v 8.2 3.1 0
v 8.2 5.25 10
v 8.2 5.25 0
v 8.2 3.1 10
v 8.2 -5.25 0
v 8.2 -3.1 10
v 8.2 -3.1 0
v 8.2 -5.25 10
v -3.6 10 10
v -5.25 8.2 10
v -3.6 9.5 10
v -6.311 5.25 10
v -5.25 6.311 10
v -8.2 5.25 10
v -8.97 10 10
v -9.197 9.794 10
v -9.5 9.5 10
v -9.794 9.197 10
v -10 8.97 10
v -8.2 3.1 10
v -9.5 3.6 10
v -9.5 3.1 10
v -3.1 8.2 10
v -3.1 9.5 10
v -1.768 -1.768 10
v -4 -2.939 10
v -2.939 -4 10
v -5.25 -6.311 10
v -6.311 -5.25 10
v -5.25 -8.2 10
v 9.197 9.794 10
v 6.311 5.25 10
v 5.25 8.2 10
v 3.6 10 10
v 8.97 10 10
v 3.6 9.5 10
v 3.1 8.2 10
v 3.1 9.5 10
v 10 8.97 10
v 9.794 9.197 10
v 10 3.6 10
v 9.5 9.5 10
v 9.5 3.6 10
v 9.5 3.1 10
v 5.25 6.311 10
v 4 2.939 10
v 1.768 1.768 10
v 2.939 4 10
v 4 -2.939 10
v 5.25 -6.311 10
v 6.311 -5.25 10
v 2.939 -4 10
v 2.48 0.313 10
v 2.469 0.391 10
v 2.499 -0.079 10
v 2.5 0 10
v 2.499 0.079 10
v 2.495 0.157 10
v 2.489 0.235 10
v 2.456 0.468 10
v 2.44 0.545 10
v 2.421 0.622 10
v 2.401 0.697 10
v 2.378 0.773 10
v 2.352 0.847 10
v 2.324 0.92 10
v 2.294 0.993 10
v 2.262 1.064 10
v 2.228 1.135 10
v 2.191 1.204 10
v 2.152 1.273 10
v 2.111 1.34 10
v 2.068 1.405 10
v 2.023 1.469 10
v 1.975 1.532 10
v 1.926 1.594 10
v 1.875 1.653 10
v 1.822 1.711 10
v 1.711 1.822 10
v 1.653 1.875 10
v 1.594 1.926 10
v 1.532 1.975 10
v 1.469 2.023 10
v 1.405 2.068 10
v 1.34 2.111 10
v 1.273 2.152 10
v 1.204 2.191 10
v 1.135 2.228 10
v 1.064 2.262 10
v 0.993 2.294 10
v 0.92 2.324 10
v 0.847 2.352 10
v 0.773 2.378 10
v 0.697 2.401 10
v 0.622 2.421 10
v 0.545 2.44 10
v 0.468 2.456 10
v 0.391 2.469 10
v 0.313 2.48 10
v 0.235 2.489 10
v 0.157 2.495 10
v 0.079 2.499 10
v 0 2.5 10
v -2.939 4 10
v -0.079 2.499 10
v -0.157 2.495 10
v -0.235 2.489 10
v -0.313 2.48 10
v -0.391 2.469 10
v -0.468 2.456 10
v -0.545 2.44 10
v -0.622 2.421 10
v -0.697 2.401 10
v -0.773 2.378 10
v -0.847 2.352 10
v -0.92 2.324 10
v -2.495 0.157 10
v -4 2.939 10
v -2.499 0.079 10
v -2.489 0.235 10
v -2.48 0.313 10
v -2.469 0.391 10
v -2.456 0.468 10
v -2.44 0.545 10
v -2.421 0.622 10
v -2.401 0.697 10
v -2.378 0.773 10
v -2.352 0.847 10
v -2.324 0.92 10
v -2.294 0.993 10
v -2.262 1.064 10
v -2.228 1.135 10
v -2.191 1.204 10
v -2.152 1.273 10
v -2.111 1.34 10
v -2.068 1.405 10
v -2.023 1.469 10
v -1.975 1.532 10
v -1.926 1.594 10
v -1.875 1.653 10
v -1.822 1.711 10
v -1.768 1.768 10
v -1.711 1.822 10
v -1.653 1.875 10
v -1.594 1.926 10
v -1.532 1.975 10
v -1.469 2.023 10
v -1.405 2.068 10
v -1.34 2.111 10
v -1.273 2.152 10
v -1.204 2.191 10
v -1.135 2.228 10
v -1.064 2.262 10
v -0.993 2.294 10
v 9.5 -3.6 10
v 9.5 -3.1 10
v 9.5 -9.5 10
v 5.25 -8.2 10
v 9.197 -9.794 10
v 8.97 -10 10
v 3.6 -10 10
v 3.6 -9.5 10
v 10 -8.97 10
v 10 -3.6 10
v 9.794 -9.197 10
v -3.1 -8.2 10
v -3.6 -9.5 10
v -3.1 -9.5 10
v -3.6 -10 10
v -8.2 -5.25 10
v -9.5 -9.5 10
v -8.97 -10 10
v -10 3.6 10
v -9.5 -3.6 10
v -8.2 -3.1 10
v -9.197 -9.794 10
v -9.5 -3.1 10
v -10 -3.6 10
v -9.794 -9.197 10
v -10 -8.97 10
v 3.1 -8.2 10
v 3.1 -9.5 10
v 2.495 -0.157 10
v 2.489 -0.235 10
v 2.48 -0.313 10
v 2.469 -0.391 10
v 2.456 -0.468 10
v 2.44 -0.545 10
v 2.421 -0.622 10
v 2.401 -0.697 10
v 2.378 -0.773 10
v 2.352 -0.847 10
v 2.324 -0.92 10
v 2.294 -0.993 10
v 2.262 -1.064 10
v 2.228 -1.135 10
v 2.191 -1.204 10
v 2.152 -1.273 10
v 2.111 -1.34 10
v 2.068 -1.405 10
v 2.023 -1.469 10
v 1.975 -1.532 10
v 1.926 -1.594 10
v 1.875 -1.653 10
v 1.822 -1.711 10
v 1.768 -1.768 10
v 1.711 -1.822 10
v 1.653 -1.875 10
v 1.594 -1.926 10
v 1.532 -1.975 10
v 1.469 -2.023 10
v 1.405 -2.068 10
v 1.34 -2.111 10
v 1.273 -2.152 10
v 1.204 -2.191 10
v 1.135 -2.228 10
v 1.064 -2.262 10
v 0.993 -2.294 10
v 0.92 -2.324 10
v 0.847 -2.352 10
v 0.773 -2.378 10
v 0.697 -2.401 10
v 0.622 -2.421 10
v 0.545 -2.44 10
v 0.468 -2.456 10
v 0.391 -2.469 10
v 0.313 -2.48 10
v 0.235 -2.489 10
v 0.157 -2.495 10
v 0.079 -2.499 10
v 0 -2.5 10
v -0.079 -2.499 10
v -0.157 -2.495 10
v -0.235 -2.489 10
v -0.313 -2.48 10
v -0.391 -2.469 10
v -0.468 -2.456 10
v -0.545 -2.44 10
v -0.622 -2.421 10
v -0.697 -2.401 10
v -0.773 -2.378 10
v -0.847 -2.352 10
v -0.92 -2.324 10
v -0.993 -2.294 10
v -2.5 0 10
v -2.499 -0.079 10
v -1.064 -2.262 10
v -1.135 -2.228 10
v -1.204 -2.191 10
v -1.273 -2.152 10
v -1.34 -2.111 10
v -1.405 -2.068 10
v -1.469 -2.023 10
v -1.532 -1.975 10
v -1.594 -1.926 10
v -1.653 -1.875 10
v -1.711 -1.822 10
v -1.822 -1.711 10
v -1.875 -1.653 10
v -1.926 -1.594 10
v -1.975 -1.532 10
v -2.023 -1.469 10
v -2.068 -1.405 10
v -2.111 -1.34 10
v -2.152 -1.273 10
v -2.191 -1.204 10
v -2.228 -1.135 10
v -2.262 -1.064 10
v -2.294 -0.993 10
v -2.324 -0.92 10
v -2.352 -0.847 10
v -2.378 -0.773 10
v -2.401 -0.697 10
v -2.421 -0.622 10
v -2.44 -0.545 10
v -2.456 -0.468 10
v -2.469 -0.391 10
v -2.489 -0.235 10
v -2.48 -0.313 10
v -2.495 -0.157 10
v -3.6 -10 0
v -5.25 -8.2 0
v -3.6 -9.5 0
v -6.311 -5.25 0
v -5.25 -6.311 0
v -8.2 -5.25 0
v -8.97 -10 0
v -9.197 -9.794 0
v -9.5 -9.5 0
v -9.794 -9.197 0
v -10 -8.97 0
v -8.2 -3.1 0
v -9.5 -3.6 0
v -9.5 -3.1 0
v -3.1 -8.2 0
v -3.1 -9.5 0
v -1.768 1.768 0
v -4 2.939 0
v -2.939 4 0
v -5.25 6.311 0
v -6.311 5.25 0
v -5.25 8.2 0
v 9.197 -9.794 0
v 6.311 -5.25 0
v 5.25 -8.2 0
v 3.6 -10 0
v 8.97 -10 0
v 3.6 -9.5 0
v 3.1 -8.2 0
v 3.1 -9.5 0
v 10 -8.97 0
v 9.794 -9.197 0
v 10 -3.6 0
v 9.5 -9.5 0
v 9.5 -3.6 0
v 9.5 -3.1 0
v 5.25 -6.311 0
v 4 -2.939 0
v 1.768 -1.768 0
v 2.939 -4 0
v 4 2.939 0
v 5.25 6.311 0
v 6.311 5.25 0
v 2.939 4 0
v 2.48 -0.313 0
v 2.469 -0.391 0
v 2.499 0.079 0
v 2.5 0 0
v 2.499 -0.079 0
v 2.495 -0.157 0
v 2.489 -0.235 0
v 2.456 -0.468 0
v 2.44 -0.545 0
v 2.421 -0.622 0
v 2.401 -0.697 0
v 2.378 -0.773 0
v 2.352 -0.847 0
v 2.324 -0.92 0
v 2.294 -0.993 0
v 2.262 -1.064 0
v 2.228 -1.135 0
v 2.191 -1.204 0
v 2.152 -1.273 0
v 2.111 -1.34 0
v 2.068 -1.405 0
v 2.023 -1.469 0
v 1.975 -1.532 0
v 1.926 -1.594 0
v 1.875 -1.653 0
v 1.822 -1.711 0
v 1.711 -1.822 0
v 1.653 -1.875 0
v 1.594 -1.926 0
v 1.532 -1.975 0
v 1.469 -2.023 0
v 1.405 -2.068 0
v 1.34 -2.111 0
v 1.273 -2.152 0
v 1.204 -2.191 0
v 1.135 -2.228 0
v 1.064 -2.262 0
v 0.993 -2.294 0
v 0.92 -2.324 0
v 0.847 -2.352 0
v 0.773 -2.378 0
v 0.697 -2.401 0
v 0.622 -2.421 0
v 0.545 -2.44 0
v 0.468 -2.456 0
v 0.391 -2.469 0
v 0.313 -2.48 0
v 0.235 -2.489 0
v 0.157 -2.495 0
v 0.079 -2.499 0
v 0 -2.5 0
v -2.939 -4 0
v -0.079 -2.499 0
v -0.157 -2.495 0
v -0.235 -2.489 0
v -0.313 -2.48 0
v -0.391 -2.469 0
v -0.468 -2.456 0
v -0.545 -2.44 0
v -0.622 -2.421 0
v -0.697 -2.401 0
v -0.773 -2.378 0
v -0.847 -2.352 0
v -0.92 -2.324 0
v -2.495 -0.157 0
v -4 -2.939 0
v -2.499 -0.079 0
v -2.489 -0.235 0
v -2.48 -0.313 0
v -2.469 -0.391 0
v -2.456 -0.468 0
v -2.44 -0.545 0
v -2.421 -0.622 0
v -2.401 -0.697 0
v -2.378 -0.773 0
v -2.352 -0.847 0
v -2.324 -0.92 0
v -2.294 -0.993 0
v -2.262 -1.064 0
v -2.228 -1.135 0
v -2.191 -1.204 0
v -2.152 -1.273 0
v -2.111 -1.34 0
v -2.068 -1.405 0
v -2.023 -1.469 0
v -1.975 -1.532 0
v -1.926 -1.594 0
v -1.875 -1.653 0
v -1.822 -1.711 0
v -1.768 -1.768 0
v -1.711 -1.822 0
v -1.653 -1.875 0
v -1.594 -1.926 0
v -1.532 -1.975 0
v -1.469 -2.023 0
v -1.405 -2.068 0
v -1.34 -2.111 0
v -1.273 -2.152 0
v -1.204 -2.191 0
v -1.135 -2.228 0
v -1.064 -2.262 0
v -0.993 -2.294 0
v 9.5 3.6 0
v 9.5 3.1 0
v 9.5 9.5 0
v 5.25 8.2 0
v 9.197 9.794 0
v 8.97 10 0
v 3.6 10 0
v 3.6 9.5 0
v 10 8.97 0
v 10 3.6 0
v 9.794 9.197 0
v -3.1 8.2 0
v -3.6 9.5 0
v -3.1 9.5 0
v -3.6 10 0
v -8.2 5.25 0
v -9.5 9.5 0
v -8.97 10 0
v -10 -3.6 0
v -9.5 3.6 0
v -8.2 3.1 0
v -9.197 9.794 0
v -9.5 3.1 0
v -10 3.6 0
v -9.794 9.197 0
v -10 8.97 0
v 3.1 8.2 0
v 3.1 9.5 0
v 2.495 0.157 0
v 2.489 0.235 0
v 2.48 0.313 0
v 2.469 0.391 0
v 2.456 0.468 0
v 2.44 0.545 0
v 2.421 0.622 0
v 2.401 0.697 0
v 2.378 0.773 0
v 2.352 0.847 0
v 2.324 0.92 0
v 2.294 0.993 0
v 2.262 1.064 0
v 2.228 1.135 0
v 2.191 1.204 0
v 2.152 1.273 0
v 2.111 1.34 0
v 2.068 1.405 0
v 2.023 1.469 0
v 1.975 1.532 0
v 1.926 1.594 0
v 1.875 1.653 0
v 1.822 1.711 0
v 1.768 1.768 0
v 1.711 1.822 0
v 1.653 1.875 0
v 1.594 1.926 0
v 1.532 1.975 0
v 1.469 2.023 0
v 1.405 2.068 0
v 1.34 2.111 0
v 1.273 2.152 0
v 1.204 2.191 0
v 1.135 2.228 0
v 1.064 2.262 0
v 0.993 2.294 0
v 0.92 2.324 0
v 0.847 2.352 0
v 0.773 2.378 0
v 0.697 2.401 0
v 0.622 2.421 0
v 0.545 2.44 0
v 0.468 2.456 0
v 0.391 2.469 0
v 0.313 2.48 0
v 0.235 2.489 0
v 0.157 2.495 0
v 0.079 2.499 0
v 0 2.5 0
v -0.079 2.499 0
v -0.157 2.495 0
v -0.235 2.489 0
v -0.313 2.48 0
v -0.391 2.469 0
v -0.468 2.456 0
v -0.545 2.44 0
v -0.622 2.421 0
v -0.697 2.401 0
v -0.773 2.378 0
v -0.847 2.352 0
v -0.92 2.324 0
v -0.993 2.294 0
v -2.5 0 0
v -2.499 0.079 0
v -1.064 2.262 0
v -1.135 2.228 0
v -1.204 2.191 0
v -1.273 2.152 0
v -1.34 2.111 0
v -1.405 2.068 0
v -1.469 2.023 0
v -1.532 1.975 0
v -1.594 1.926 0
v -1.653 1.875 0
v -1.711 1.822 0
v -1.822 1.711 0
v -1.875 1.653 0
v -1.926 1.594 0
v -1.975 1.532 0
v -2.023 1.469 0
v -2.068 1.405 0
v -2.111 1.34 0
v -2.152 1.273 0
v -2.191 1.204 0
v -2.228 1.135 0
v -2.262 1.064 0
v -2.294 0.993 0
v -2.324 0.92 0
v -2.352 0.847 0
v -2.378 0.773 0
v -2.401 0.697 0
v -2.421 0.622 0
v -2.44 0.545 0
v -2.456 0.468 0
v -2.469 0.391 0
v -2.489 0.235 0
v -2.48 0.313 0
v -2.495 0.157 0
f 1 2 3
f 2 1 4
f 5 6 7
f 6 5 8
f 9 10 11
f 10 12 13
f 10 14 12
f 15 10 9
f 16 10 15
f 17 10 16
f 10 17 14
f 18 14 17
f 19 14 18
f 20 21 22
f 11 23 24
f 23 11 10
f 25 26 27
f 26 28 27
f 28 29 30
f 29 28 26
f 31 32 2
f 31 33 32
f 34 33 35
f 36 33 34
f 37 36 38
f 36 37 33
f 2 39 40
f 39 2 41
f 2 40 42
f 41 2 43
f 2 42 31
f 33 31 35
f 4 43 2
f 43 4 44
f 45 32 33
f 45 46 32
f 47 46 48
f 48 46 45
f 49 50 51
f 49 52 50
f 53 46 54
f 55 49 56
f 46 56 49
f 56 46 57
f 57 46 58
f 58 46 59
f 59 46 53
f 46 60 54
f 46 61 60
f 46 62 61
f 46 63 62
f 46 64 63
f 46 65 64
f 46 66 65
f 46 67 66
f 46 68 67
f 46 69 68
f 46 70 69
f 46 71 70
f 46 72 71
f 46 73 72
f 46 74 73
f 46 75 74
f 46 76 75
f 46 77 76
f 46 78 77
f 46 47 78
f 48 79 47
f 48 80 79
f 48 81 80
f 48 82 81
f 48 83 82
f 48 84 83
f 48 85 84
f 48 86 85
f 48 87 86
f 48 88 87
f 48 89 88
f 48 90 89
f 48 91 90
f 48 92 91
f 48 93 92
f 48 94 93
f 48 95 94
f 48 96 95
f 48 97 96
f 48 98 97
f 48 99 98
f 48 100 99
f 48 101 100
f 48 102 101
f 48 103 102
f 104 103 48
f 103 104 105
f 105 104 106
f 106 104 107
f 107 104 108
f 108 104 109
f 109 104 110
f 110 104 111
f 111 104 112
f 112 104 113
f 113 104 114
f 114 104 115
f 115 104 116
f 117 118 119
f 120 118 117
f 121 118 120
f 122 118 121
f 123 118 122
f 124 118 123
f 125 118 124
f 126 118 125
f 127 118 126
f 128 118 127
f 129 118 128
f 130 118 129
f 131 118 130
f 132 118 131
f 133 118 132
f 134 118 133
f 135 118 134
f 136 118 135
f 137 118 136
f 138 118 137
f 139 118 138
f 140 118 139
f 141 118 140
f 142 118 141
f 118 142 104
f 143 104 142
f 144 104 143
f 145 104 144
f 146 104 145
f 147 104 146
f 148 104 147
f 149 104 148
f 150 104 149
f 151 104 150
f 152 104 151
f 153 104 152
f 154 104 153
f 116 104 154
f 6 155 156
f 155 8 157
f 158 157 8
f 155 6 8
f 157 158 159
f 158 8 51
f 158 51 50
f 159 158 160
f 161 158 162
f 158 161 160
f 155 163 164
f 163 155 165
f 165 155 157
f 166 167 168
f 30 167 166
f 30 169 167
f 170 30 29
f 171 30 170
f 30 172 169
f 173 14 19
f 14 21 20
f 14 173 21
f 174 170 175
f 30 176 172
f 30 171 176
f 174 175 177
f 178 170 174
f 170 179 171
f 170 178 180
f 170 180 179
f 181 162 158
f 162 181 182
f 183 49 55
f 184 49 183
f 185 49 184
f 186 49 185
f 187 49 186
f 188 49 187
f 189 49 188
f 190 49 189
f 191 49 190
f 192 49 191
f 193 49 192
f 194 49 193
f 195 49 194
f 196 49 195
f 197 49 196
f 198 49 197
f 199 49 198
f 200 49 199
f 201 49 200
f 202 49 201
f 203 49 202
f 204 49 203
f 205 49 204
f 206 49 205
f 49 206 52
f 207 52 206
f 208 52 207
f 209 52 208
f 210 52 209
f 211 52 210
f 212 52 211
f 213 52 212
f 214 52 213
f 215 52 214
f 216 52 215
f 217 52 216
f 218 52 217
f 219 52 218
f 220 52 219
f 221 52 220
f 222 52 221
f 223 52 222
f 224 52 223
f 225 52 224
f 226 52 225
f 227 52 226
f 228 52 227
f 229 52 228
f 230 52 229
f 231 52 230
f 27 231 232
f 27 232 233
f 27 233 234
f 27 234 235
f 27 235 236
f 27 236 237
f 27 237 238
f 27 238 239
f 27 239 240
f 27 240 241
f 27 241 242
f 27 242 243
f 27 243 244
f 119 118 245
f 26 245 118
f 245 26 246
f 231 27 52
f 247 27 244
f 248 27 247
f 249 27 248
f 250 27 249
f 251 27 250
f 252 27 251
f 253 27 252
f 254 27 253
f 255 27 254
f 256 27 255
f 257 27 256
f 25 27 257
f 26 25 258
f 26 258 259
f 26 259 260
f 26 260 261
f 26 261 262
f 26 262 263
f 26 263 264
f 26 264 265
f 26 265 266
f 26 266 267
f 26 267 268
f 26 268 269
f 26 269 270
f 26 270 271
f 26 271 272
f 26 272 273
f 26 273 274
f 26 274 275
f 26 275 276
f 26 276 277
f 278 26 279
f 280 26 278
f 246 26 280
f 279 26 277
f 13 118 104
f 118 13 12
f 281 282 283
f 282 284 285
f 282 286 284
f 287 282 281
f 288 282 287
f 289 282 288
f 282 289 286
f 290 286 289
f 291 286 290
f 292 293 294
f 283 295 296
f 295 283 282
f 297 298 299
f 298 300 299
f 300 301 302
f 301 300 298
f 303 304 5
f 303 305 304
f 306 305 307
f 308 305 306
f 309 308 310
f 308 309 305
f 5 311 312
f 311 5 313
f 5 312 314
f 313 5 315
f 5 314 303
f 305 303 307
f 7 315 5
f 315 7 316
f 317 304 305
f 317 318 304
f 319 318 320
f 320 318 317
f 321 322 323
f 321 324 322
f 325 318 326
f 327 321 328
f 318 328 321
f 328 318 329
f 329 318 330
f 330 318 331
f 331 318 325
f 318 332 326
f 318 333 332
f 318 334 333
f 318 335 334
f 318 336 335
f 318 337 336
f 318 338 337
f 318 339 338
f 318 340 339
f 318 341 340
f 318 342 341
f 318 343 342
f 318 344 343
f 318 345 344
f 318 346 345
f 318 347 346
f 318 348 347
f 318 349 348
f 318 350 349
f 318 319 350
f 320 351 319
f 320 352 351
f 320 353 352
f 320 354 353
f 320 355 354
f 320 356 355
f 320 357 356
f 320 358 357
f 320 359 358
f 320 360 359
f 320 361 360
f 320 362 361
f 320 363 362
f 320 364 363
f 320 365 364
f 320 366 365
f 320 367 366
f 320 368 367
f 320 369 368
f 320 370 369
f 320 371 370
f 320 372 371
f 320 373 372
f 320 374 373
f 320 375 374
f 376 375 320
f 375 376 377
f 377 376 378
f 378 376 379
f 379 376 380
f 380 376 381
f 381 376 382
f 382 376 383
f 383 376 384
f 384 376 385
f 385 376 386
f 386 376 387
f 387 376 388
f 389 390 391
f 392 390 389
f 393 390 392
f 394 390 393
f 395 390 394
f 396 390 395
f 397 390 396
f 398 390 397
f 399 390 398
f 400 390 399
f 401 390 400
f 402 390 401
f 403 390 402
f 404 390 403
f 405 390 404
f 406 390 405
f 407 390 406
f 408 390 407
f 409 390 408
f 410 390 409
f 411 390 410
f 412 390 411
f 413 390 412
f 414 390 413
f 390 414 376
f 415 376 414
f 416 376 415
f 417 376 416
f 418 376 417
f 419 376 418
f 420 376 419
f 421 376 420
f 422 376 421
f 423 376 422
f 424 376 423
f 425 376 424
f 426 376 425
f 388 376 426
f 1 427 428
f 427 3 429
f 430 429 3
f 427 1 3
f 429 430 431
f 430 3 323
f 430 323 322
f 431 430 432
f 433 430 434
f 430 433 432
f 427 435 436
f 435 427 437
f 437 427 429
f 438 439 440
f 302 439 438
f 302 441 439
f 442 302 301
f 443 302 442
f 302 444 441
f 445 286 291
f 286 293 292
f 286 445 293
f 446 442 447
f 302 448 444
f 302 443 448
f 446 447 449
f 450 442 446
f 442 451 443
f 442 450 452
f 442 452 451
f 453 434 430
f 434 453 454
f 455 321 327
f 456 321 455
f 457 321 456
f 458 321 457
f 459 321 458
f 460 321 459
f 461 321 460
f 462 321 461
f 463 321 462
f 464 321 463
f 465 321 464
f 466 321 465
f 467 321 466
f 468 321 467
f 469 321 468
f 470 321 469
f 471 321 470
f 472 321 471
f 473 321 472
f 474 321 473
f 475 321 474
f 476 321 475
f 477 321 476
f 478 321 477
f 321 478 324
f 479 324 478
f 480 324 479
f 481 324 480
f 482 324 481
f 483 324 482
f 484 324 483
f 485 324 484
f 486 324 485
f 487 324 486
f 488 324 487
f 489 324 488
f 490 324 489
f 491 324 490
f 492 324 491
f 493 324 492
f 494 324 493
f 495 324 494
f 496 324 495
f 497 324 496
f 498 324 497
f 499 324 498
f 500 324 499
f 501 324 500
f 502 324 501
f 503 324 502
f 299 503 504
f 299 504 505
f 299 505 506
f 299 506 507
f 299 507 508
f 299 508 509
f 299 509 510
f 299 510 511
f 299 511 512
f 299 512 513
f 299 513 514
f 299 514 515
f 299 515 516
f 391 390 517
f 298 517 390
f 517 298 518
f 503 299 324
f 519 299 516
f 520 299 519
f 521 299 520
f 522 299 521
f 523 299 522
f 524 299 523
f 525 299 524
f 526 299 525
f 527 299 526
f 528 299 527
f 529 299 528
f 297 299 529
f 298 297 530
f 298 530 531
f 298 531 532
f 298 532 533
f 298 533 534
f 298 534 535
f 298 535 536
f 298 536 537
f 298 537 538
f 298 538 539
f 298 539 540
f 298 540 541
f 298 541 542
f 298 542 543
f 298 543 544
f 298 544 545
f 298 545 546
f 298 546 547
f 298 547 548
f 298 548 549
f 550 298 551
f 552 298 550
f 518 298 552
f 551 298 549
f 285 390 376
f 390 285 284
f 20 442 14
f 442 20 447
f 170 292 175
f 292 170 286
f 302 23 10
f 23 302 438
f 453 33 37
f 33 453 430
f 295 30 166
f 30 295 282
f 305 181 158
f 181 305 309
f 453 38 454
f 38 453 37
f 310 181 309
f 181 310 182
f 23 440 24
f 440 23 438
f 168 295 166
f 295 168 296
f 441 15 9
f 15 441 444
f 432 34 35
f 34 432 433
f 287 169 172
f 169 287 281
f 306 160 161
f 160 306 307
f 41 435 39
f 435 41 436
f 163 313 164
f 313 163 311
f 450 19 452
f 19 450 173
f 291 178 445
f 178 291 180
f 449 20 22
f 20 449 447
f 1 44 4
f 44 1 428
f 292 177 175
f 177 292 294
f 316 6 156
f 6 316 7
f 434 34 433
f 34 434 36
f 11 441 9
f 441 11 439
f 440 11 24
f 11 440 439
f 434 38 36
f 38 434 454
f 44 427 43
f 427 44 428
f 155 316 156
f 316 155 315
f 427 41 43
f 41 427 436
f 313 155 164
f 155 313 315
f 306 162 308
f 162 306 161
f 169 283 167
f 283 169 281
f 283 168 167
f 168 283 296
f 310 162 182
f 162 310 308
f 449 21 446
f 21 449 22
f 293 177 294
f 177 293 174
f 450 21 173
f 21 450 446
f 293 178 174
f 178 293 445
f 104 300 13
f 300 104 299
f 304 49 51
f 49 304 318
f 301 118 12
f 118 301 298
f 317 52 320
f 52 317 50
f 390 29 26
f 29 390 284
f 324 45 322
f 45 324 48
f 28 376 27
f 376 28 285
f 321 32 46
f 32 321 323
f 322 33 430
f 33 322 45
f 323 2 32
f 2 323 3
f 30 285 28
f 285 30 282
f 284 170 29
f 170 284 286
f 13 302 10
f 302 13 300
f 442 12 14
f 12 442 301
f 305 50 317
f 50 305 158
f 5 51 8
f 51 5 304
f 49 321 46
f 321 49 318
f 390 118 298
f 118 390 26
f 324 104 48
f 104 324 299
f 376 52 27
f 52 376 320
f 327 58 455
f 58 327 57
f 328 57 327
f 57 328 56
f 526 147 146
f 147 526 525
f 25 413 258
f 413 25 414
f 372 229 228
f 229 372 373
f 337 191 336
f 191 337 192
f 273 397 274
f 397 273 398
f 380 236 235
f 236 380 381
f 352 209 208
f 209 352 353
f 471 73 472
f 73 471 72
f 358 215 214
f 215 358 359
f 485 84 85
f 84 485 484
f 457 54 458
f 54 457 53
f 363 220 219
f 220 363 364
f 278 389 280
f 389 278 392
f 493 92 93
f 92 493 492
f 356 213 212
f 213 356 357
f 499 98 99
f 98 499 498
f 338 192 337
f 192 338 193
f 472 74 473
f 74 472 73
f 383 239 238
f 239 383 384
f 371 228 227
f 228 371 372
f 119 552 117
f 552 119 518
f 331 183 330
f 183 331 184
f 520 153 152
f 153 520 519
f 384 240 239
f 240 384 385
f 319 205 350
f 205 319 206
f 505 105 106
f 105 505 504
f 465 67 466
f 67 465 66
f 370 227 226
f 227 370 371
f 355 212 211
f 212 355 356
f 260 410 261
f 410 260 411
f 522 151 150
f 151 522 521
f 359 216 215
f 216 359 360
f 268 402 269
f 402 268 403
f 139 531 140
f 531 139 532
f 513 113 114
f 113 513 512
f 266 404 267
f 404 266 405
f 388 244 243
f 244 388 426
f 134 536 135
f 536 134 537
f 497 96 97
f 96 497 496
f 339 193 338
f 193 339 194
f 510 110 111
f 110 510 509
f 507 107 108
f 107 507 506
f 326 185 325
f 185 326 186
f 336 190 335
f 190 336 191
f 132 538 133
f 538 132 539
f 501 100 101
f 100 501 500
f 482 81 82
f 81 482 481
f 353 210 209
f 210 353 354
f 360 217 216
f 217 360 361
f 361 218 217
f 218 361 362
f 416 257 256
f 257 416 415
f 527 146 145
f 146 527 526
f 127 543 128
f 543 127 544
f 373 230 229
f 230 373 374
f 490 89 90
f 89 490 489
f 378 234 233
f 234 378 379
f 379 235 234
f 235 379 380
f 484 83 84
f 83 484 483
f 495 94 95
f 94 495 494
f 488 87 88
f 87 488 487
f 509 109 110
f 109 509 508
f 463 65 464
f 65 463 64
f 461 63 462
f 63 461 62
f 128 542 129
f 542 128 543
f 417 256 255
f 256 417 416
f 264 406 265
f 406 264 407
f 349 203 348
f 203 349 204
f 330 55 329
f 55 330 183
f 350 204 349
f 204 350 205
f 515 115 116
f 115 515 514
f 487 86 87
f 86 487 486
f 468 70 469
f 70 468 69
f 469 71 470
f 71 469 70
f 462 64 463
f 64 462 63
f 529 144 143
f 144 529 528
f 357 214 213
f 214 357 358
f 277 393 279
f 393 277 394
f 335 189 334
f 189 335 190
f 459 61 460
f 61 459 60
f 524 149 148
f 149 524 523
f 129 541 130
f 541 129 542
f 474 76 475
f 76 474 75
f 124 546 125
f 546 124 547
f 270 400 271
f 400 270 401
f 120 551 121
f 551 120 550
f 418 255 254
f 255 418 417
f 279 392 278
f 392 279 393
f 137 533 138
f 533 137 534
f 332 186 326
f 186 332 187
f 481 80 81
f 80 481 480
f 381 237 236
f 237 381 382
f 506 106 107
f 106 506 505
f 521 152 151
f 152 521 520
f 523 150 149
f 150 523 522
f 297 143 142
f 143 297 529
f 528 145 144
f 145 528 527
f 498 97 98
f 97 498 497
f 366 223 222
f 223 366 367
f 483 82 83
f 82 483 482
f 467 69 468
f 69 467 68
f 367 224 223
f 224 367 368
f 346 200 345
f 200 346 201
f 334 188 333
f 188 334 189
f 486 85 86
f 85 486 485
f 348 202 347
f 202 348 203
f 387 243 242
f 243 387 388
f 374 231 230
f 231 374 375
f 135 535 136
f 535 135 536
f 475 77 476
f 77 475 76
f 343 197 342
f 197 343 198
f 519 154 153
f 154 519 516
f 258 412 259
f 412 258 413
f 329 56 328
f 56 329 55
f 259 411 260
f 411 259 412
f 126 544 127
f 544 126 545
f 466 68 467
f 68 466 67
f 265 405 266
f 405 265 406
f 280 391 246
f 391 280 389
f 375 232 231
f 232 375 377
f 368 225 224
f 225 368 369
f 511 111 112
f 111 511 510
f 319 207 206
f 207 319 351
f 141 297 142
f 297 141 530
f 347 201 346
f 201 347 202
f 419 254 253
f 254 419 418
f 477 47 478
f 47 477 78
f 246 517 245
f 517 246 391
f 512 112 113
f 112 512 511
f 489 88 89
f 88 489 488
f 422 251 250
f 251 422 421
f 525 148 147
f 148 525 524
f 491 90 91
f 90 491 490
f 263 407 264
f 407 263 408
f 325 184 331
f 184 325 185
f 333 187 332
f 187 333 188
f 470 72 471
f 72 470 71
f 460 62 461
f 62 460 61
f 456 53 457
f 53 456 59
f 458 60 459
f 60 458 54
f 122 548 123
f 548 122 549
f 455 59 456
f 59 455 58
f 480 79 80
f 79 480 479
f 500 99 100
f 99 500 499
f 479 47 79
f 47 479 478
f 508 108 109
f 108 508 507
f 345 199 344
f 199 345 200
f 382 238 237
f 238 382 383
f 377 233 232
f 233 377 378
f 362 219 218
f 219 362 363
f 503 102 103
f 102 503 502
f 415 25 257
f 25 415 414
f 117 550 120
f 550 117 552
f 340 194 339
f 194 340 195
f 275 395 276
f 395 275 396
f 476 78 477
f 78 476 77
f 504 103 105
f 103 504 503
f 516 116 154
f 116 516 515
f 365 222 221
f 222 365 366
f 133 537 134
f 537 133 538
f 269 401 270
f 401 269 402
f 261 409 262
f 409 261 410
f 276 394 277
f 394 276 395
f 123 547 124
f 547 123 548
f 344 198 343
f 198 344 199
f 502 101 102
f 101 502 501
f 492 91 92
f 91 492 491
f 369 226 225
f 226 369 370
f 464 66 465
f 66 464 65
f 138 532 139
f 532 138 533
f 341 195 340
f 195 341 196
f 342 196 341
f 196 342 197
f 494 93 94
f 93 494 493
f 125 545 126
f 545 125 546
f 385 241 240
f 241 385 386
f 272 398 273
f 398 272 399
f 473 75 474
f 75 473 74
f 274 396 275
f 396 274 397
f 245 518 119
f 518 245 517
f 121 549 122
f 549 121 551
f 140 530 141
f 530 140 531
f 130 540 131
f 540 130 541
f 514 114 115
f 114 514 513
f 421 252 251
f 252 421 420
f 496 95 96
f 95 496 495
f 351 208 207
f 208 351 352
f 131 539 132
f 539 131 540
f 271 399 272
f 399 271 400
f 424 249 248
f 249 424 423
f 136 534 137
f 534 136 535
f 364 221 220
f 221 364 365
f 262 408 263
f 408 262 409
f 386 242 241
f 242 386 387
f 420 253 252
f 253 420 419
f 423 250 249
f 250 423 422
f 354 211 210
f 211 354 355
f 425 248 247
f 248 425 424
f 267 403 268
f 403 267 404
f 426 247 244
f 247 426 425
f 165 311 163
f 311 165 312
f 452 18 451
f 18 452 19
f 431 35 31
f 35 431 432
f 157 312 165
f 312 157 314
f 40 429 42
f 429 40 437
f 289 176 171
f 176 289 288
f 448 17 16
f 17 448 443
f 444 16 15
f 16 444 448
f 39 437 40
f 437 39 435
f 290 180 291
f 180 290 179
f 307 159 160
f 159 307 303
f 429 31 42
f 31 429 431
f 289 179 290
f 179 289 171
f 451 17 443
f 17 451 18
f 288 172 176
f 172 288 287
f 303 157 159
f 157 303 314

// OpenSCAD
/* Global */

//Extrusion height
bar_height= 10;

print_part();

module print_part(){
    
    translate([0,0,bar_height/2])
    intersection(){
        cylinder(d=26.87,h=bar_height,center=true, $fn=200);
        difference(){
            union(){
                difference(){
                cube([20,20,bar_height],center=true);
                    union()    
                    {
                        cube([16.4,16.4,bar_height],center=true);
                        cube([6.2,20,bar_height],center=true);
                        cube([20,6.2,bar_height],center=true);
                        
                        translate([0,9.75,0])
                        cube([7.2,0.5,bar_height],center=true);
                        translate([9.75,0,0])
                        cube([0.5,7.2,bar_height],center=true);
                        translate([0,-9.75,0])
                        cube([7.2,0.5,bar_height],center=true);
                        translate([-9.75,0,0])
                        cube([0.5,7.2,bar_height],center=true);
                    }
                        
                }
                rotate([0,0,45]){
                    cube([1.5,26,bar_height],center=true);
                    cube([26,1.5,bar_height],center=true);
                }
                translate([7.5,7.5,0])cube([4.5,4.5,bar_height],center=true);
                translate([-7.5,-7.5,0])cube([4.5,4.5,bar_height],center=true);
                translate([-7.5,7.5,0])cube([4.5,4.5,bar_height],center=true);
                translate([7.5,-7.5,0])cube([4.5,4.5,bar_height],center=true);
                cube([8,8,bar_height],center=true);
            }
            cylinder(r=2.5,h=bar_height,center=true, $fn=200);
        }
}
}
